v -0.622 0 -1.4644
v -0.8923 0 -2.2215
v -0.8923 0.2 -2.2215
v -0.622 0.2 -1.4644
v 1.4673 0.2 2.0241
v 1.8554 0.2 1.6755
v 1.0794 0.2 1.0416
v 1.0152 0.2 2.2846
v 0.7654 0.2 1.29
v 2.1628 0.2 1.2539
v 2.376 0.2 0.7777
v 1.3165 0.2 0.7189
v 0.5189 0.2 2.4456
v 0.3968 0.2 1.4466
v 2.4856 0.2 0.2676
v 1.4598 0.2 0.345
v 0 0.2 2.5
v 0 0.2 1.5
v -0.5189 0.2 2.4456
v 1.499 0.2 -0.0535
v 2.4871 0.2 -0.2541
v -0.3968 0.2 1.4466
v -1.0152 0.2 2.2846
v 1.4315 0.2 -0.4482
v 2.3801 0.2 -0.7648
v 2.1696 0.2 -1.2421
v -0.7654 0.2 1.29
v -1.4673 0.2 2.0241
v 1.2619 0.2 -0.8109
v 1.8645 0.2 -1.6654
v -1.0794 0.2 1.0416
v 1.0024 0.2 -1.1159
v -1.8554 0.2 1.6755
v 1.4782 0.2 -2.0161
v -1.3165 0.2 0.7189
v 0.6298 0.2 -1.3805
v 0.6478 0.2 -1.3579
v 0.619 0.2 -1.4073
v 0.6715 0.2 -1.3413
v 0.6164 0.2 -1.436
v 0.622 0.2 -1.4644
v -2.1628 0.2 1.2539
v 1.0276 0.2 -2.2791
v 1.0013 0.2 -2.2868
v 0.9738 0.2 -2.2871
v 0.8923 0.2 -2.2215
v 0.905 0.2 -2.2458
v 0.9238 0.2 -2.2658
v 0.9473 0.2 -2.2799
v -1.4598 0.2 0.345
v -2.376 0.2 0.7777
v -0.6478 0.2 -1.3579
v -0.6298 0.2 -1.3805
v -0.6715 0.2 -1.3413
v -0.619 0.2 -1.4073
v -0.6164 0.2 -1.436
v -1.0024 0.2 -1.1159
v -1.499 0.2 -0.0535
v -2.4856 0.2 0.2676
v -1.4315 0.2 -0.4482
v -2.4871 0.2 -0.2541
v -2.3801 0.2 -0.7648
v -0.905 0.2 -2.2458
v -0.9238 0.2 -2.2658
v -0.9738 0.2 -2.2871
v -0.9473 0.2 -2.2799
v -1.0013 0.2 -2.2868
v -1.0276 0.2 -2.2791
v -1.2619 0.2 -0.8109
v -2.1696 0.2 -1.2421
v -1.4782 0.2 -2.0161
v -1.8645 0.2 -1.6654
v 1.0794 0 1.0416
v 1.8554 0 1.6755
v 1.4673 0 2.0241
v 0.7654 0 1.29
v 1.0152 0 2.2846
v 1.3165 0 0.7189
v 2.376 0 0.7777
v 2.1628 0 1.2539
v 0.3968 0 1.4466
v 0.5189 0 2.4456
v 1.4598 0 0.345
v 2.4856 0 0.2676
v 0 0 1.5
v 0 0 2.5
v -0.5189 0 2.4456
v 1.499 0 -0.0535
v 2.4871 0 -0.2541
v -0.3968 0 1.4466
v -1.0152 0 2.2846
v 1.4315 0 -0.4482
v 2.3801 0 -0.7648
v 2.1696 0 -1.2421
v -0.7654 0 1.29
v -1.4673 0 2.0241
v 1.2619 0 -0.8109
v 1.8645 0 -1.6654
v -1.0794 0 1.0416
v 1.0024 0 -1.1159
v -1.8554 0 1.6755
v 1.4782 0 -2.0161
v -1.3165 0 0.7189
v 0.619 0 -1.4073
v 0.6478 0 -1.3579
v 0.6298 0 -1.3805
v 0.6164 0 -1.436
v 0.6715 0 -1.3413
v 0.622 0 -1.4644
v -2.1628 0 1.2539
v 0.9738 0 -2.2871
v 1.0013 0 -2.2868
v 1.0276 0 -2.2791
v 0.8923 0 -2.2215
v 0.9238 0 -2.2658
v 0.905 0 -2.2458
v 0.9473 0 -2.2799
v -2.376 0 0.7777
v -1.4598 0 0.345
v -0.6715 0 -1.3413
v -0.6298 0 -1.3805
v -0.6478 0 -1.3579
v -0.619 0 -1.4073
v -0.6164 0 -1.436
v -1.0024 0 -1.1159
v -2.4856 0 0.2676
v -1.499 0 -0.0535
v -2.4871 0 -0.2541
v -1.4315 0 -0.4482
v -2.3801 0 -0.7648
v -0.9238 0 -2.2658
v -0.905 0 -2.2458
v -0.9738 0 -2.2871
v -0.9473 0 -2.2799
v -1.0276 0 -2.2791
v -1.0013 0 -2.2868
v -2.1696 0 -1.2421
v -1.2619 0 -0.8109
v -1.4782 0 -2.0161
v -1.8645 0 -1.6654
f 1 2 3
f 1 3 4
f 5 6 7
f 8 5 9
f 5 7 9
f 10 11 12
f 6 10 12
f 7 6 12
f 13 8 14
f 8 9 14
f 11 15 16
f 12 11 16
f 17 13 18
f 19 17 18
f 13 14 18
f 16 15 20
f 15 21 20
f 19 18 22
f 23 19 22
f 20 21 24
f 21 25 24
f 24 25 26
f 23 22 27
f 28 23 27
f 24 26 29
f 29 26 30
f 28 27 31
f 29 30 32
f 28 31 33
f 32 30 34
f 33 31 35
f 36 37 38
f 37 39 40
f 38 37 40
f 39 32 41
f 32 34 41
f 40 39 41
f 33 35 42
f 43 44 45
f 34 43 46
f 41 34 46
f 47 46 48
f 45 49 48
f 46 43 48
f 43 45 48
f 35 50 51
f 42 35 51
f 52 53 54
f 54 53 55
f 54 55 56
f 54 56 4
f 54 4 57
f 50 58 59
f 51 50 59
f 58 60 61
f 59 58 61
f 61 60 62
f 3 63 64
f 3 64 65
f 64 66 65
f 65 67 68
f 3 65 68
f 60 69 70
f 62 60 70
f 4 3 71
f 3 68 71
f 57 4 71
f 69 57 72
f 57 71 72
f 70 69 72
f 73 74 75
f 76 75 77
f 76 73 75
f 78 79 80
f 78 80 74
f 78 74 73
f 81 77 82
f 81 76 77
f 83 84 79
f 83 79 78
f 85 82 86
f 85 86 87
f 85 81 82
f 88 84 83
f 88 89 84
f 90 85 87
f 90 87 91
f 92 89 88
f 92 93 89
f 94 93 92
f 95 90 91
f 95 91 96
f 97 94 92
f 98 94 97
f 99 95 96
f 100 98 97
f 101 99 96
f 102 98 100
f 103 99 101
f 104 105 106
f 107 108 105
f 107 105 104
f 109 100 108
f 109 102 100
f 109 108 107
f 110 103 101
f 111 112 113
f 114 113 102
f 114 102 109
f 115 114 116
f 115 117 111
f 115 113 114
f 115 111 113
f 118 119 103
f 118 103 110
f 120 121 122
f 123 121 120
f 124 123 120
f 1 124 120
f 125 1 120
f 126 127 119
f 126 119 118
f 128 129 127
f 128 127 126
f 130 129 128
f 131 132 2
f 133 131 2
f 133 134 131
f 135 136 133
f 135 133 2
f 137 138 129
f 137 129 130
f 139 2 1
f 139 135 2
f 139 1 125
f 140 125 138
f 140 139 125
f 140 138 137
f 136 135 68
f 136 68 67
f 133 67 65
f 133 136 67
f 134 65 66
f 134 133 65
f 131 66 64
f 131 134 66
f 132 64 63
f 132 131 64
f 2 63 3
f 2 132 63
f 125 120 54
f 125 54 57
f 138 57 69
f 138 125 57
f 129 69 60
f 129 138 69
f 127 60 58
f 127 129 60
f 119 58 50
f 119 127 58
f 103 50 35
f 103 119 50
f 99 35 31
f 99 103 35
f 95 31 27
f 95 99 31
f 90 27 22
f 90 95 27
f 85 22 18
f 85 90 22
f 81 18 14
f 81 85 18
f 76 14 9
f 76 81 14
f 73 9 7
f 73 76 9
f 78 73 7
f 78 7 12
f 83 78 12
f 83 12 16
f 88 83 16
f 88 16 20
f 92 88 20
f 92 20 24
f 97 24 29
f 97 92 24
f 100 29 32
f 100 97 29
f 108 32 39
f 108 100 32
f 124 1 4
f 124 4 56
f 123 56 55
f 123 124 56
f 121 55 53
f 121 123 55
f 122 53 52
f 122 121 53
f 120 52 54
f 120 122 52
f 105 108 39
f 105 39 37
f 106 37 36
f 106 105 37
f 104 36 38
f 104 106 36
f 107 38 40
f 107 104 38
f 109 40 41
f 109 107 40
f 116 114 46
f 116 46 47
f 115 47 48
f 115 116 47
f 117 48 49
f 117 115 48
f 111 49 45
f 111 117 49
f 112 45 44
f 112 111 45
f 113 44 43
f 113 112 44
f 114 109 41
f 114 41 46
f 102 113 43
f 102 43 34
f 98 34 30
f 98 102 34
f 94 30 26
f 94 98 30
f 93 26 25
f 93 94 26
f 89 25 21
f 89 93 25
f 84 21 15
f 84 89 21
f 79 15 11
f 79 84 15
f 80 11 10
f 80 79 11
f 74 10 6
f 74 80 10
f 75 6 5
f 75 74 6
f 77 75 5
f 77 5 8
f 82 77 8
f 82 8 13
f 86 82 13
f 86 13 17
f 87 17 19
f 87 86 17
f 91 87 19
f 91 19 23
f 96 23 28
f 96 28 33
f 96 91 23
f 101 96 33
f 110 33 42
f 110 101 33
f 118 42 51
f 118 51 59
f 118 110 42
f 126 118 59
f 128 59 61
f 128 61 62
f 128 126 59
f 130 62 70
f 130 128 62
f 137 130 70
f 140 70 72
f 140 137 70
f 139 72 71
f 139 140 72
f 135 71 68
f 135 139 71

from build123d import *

# Parameters (mm, degrees)
BOSS_EXTRUDE1_DEPTH = 0.2


with BuildPart() as part:
    # Sketch4 → Boss-Extrude1 (new body)
    with BuildSketch(Plane(origin=(0, 0, 0), x_dir=(1, 0, 0), z_dir=(0, 1, 0))):
        with BuildLine():
            Line((-0.892301784, 2.221506026), (-0.62203599, 1.464364274))
            ThreePointArc((-0.62203599, 1.464364274), (-0.623420326, 1.393476941), (-0.671452287, 1.341324653))
            ThreePointArc((-0.671452287, 1.341324653), (0, -1.5), (0.671452287, 1.341324653))
            ThreePointArc((0.671452287, 1.341324653), (0.623420326, 1.393476941), (0.62203599, 1.464364274))
            Line((0.62203599, 1.464364274), (0.892301784, 2.221506026))
            ThreePointArc((0.892301784, 2.221506026), (0.947339463, 2.279909219), (1.027584966, 2.279050052))
            ThreePointArc((1.027584966, 2.279050052), (0, -2.5), (-1.027584966, 2.279050052))
            ThreePointArc((-1.027584966, 2.279050052), (-0.947339463, 2.279909219), (-0.892301784, 2.221506026))
        make_face()
    extrude(amount=BOSS_EXTRUDE1_DEPTH)


solid = part.part
